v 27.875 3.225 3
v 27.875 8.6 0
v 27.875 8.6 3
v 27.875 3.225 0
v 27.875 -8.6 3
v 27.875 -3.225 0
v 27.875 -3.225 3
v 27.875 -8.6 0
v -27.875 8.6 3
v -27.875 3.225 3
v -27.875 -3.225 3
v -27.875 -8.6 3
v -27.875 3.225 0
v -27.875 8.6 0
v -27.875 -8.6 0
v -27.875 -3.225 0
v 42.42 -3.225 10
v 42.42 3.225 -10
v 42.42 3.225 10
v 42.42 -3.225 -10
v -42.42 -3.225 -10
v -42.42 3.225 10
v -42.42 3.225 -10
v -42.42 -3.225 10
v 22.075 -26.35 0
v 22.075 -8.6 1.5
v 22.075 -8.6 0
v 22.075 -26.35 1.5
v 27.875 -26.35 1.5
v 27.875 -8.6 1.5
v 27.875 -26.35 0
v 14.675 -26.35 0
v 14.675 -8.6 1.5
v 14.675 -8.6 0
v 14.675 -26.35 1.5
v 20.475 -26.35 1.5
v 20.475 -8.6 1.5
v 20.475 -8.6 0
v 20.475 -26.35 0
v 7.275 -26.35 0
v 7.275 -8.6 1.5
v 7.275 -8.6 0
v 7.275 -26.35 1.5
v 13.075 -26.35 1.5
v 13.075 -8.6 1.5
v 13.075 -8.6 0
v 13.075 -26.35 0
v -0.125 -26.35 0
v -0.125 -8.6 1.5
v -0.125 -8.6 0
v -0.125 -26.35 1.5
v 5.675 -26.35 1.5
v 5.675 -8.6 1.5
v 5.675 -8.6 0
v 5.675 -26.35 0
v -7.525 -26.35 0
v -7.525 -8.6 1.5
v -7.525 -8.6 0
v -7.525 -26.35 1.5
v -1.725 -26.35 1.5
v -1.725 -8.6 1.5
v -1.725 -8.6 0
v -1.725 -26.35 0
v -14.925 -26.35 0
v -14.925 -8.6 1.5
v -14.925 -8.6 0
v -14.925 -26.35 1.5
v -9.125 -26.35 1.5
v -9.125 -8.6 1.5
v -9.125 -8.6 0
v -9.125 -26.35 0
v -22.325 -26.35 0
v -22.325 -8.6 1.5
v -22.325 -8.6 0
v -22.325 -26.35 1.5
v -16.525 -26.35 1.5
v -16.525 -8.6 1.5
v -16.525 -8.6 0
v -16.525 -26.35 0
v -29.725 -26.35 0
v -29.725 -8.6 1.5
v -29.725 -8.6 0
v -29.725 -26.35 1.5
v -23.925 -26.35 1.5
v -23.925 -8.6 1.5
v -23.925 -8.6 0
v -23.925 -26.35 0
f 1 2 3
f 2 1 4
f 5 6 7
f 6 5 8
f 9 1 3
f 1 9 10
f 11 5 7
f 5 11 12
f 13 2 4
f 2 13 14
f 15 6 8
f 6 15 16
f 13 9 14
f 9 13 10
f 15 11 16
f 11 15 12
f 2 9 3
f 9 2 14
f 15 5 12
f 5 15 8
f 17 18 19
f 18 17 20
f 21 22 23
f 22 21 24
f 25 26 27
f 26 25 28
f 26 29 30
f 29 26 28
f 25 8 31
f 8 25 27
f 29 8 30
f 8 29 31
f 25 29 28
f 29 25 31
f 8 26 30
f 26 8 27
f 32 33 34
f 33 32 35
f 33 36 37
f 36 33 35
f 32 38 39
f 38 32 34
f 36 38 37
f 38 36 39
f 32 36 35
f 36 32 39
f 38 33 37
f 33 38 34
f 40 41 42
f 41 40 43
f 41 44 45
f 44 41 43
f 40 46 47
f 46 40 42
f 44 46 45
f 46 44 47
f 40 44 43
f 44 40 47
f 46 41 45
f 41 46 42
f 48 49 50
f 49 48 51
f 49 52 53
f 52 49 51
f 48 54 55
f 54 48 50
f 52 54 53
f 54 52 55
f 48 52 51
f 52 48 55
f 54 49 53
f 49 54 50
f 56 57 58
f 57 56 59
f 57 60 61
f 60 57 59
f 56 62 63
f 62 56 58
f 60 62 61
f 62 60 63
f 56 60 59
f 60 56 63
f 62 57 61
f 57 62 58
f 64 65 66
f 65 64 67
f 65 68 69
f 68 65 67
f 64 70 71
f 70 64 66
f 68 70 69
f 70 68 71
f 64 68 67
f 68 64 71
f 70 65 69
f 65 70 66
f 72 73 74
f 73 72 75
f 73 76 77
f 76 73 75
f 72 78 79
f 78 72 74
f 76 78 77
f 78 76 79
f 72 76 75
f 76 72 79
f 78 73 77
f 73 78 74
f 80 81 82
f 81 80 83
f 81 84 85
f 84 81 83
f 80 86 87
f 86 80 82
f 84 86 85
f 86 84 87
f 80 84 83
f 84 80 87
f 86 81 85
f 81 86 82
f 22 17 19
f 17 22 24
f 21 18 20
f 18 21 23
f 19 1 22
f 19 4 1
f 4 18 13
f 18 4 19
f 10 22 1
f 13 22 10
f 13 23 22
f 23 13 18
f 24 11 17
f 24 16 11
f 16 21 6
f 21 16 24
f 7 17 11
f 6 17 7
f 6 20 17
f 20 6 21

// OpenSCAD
echo(version=version());

// Number of teeth. Tooth width is calculated from tooth count, gap, and available space.
// Taking references from http://gelcombs.com/products/single-gel-combs.php
tooth_count = 8; // Number of wells
tooth_width = 5.8; // Width of each tooth
tooth_thickness = 0; // Thickness of each tooth
tooth_gap = 1.6; // Spacing between teeth.

tooth_length = 17.75;  // Length of teeth (measured perpendicular from comb)
tooth_margin = 0; // Width reserved on either end of comb to be free of teeth.

front_tooth_height = 1.5;
rear_tooth_height = 0;

/* Upper Body */

cube([84.84, 6.45, 20], center = true);

comb_x = 55.75; // Width of lower section of comb core.
comb_y = 17.2; // Length (narrow dimension) or lower section of comb core, not counting teeth.
comb_z = 3.0; // Height of lower section of comb core (from base).
raised_x = 84.84;// Width of raised section of comb core (centered in lower section).
raised_y = 5;// Length (narrow dimension) of raised section of comb core (centered in lower section).
raised_z = 7.25;// Height of raised section of comb core (from base).

/* [Hidden] */

// Width available for teeth (comb width minus margins).
tooth_span = comb_x - (2 * tooth_margin);

// Individual tooth width (maximum to fill span with count teeth with gap betwen each).
// tooth_width = (tooth_span - (tooth_count - 1) * tooth_gap) / tooth_count;

echo(tooth_width);

union() {
	Core();
	Teeth(rear_tooth_height);
	rotate([0, 0, 180]) Teeth(front_tooth_height);
}

module Core() {
	union() {
		translate([0, 0, comb_z/2]) cube([comb_x, comb_y, comb_z], center=true);
		translate([0, 0, raised_z/2]) cube([raised_x, raised_y, raised_z], center=true);
	}
}

module Teeth(height) {
	translate([-tooth_span/2 + tooth_width/2, comb_y/2, 0]) union() {
		for(i = [0:tooth_count-1]) {
			translate([i * (tooth_width + tooth_gap), 0, 0]) Tooth(tooth_width, tooth_length, height);
		}
	}
}

module Tooth(width, length, height) {
	translate([0, length/2, height/2]) cube([width, length, height], center=true);
}
